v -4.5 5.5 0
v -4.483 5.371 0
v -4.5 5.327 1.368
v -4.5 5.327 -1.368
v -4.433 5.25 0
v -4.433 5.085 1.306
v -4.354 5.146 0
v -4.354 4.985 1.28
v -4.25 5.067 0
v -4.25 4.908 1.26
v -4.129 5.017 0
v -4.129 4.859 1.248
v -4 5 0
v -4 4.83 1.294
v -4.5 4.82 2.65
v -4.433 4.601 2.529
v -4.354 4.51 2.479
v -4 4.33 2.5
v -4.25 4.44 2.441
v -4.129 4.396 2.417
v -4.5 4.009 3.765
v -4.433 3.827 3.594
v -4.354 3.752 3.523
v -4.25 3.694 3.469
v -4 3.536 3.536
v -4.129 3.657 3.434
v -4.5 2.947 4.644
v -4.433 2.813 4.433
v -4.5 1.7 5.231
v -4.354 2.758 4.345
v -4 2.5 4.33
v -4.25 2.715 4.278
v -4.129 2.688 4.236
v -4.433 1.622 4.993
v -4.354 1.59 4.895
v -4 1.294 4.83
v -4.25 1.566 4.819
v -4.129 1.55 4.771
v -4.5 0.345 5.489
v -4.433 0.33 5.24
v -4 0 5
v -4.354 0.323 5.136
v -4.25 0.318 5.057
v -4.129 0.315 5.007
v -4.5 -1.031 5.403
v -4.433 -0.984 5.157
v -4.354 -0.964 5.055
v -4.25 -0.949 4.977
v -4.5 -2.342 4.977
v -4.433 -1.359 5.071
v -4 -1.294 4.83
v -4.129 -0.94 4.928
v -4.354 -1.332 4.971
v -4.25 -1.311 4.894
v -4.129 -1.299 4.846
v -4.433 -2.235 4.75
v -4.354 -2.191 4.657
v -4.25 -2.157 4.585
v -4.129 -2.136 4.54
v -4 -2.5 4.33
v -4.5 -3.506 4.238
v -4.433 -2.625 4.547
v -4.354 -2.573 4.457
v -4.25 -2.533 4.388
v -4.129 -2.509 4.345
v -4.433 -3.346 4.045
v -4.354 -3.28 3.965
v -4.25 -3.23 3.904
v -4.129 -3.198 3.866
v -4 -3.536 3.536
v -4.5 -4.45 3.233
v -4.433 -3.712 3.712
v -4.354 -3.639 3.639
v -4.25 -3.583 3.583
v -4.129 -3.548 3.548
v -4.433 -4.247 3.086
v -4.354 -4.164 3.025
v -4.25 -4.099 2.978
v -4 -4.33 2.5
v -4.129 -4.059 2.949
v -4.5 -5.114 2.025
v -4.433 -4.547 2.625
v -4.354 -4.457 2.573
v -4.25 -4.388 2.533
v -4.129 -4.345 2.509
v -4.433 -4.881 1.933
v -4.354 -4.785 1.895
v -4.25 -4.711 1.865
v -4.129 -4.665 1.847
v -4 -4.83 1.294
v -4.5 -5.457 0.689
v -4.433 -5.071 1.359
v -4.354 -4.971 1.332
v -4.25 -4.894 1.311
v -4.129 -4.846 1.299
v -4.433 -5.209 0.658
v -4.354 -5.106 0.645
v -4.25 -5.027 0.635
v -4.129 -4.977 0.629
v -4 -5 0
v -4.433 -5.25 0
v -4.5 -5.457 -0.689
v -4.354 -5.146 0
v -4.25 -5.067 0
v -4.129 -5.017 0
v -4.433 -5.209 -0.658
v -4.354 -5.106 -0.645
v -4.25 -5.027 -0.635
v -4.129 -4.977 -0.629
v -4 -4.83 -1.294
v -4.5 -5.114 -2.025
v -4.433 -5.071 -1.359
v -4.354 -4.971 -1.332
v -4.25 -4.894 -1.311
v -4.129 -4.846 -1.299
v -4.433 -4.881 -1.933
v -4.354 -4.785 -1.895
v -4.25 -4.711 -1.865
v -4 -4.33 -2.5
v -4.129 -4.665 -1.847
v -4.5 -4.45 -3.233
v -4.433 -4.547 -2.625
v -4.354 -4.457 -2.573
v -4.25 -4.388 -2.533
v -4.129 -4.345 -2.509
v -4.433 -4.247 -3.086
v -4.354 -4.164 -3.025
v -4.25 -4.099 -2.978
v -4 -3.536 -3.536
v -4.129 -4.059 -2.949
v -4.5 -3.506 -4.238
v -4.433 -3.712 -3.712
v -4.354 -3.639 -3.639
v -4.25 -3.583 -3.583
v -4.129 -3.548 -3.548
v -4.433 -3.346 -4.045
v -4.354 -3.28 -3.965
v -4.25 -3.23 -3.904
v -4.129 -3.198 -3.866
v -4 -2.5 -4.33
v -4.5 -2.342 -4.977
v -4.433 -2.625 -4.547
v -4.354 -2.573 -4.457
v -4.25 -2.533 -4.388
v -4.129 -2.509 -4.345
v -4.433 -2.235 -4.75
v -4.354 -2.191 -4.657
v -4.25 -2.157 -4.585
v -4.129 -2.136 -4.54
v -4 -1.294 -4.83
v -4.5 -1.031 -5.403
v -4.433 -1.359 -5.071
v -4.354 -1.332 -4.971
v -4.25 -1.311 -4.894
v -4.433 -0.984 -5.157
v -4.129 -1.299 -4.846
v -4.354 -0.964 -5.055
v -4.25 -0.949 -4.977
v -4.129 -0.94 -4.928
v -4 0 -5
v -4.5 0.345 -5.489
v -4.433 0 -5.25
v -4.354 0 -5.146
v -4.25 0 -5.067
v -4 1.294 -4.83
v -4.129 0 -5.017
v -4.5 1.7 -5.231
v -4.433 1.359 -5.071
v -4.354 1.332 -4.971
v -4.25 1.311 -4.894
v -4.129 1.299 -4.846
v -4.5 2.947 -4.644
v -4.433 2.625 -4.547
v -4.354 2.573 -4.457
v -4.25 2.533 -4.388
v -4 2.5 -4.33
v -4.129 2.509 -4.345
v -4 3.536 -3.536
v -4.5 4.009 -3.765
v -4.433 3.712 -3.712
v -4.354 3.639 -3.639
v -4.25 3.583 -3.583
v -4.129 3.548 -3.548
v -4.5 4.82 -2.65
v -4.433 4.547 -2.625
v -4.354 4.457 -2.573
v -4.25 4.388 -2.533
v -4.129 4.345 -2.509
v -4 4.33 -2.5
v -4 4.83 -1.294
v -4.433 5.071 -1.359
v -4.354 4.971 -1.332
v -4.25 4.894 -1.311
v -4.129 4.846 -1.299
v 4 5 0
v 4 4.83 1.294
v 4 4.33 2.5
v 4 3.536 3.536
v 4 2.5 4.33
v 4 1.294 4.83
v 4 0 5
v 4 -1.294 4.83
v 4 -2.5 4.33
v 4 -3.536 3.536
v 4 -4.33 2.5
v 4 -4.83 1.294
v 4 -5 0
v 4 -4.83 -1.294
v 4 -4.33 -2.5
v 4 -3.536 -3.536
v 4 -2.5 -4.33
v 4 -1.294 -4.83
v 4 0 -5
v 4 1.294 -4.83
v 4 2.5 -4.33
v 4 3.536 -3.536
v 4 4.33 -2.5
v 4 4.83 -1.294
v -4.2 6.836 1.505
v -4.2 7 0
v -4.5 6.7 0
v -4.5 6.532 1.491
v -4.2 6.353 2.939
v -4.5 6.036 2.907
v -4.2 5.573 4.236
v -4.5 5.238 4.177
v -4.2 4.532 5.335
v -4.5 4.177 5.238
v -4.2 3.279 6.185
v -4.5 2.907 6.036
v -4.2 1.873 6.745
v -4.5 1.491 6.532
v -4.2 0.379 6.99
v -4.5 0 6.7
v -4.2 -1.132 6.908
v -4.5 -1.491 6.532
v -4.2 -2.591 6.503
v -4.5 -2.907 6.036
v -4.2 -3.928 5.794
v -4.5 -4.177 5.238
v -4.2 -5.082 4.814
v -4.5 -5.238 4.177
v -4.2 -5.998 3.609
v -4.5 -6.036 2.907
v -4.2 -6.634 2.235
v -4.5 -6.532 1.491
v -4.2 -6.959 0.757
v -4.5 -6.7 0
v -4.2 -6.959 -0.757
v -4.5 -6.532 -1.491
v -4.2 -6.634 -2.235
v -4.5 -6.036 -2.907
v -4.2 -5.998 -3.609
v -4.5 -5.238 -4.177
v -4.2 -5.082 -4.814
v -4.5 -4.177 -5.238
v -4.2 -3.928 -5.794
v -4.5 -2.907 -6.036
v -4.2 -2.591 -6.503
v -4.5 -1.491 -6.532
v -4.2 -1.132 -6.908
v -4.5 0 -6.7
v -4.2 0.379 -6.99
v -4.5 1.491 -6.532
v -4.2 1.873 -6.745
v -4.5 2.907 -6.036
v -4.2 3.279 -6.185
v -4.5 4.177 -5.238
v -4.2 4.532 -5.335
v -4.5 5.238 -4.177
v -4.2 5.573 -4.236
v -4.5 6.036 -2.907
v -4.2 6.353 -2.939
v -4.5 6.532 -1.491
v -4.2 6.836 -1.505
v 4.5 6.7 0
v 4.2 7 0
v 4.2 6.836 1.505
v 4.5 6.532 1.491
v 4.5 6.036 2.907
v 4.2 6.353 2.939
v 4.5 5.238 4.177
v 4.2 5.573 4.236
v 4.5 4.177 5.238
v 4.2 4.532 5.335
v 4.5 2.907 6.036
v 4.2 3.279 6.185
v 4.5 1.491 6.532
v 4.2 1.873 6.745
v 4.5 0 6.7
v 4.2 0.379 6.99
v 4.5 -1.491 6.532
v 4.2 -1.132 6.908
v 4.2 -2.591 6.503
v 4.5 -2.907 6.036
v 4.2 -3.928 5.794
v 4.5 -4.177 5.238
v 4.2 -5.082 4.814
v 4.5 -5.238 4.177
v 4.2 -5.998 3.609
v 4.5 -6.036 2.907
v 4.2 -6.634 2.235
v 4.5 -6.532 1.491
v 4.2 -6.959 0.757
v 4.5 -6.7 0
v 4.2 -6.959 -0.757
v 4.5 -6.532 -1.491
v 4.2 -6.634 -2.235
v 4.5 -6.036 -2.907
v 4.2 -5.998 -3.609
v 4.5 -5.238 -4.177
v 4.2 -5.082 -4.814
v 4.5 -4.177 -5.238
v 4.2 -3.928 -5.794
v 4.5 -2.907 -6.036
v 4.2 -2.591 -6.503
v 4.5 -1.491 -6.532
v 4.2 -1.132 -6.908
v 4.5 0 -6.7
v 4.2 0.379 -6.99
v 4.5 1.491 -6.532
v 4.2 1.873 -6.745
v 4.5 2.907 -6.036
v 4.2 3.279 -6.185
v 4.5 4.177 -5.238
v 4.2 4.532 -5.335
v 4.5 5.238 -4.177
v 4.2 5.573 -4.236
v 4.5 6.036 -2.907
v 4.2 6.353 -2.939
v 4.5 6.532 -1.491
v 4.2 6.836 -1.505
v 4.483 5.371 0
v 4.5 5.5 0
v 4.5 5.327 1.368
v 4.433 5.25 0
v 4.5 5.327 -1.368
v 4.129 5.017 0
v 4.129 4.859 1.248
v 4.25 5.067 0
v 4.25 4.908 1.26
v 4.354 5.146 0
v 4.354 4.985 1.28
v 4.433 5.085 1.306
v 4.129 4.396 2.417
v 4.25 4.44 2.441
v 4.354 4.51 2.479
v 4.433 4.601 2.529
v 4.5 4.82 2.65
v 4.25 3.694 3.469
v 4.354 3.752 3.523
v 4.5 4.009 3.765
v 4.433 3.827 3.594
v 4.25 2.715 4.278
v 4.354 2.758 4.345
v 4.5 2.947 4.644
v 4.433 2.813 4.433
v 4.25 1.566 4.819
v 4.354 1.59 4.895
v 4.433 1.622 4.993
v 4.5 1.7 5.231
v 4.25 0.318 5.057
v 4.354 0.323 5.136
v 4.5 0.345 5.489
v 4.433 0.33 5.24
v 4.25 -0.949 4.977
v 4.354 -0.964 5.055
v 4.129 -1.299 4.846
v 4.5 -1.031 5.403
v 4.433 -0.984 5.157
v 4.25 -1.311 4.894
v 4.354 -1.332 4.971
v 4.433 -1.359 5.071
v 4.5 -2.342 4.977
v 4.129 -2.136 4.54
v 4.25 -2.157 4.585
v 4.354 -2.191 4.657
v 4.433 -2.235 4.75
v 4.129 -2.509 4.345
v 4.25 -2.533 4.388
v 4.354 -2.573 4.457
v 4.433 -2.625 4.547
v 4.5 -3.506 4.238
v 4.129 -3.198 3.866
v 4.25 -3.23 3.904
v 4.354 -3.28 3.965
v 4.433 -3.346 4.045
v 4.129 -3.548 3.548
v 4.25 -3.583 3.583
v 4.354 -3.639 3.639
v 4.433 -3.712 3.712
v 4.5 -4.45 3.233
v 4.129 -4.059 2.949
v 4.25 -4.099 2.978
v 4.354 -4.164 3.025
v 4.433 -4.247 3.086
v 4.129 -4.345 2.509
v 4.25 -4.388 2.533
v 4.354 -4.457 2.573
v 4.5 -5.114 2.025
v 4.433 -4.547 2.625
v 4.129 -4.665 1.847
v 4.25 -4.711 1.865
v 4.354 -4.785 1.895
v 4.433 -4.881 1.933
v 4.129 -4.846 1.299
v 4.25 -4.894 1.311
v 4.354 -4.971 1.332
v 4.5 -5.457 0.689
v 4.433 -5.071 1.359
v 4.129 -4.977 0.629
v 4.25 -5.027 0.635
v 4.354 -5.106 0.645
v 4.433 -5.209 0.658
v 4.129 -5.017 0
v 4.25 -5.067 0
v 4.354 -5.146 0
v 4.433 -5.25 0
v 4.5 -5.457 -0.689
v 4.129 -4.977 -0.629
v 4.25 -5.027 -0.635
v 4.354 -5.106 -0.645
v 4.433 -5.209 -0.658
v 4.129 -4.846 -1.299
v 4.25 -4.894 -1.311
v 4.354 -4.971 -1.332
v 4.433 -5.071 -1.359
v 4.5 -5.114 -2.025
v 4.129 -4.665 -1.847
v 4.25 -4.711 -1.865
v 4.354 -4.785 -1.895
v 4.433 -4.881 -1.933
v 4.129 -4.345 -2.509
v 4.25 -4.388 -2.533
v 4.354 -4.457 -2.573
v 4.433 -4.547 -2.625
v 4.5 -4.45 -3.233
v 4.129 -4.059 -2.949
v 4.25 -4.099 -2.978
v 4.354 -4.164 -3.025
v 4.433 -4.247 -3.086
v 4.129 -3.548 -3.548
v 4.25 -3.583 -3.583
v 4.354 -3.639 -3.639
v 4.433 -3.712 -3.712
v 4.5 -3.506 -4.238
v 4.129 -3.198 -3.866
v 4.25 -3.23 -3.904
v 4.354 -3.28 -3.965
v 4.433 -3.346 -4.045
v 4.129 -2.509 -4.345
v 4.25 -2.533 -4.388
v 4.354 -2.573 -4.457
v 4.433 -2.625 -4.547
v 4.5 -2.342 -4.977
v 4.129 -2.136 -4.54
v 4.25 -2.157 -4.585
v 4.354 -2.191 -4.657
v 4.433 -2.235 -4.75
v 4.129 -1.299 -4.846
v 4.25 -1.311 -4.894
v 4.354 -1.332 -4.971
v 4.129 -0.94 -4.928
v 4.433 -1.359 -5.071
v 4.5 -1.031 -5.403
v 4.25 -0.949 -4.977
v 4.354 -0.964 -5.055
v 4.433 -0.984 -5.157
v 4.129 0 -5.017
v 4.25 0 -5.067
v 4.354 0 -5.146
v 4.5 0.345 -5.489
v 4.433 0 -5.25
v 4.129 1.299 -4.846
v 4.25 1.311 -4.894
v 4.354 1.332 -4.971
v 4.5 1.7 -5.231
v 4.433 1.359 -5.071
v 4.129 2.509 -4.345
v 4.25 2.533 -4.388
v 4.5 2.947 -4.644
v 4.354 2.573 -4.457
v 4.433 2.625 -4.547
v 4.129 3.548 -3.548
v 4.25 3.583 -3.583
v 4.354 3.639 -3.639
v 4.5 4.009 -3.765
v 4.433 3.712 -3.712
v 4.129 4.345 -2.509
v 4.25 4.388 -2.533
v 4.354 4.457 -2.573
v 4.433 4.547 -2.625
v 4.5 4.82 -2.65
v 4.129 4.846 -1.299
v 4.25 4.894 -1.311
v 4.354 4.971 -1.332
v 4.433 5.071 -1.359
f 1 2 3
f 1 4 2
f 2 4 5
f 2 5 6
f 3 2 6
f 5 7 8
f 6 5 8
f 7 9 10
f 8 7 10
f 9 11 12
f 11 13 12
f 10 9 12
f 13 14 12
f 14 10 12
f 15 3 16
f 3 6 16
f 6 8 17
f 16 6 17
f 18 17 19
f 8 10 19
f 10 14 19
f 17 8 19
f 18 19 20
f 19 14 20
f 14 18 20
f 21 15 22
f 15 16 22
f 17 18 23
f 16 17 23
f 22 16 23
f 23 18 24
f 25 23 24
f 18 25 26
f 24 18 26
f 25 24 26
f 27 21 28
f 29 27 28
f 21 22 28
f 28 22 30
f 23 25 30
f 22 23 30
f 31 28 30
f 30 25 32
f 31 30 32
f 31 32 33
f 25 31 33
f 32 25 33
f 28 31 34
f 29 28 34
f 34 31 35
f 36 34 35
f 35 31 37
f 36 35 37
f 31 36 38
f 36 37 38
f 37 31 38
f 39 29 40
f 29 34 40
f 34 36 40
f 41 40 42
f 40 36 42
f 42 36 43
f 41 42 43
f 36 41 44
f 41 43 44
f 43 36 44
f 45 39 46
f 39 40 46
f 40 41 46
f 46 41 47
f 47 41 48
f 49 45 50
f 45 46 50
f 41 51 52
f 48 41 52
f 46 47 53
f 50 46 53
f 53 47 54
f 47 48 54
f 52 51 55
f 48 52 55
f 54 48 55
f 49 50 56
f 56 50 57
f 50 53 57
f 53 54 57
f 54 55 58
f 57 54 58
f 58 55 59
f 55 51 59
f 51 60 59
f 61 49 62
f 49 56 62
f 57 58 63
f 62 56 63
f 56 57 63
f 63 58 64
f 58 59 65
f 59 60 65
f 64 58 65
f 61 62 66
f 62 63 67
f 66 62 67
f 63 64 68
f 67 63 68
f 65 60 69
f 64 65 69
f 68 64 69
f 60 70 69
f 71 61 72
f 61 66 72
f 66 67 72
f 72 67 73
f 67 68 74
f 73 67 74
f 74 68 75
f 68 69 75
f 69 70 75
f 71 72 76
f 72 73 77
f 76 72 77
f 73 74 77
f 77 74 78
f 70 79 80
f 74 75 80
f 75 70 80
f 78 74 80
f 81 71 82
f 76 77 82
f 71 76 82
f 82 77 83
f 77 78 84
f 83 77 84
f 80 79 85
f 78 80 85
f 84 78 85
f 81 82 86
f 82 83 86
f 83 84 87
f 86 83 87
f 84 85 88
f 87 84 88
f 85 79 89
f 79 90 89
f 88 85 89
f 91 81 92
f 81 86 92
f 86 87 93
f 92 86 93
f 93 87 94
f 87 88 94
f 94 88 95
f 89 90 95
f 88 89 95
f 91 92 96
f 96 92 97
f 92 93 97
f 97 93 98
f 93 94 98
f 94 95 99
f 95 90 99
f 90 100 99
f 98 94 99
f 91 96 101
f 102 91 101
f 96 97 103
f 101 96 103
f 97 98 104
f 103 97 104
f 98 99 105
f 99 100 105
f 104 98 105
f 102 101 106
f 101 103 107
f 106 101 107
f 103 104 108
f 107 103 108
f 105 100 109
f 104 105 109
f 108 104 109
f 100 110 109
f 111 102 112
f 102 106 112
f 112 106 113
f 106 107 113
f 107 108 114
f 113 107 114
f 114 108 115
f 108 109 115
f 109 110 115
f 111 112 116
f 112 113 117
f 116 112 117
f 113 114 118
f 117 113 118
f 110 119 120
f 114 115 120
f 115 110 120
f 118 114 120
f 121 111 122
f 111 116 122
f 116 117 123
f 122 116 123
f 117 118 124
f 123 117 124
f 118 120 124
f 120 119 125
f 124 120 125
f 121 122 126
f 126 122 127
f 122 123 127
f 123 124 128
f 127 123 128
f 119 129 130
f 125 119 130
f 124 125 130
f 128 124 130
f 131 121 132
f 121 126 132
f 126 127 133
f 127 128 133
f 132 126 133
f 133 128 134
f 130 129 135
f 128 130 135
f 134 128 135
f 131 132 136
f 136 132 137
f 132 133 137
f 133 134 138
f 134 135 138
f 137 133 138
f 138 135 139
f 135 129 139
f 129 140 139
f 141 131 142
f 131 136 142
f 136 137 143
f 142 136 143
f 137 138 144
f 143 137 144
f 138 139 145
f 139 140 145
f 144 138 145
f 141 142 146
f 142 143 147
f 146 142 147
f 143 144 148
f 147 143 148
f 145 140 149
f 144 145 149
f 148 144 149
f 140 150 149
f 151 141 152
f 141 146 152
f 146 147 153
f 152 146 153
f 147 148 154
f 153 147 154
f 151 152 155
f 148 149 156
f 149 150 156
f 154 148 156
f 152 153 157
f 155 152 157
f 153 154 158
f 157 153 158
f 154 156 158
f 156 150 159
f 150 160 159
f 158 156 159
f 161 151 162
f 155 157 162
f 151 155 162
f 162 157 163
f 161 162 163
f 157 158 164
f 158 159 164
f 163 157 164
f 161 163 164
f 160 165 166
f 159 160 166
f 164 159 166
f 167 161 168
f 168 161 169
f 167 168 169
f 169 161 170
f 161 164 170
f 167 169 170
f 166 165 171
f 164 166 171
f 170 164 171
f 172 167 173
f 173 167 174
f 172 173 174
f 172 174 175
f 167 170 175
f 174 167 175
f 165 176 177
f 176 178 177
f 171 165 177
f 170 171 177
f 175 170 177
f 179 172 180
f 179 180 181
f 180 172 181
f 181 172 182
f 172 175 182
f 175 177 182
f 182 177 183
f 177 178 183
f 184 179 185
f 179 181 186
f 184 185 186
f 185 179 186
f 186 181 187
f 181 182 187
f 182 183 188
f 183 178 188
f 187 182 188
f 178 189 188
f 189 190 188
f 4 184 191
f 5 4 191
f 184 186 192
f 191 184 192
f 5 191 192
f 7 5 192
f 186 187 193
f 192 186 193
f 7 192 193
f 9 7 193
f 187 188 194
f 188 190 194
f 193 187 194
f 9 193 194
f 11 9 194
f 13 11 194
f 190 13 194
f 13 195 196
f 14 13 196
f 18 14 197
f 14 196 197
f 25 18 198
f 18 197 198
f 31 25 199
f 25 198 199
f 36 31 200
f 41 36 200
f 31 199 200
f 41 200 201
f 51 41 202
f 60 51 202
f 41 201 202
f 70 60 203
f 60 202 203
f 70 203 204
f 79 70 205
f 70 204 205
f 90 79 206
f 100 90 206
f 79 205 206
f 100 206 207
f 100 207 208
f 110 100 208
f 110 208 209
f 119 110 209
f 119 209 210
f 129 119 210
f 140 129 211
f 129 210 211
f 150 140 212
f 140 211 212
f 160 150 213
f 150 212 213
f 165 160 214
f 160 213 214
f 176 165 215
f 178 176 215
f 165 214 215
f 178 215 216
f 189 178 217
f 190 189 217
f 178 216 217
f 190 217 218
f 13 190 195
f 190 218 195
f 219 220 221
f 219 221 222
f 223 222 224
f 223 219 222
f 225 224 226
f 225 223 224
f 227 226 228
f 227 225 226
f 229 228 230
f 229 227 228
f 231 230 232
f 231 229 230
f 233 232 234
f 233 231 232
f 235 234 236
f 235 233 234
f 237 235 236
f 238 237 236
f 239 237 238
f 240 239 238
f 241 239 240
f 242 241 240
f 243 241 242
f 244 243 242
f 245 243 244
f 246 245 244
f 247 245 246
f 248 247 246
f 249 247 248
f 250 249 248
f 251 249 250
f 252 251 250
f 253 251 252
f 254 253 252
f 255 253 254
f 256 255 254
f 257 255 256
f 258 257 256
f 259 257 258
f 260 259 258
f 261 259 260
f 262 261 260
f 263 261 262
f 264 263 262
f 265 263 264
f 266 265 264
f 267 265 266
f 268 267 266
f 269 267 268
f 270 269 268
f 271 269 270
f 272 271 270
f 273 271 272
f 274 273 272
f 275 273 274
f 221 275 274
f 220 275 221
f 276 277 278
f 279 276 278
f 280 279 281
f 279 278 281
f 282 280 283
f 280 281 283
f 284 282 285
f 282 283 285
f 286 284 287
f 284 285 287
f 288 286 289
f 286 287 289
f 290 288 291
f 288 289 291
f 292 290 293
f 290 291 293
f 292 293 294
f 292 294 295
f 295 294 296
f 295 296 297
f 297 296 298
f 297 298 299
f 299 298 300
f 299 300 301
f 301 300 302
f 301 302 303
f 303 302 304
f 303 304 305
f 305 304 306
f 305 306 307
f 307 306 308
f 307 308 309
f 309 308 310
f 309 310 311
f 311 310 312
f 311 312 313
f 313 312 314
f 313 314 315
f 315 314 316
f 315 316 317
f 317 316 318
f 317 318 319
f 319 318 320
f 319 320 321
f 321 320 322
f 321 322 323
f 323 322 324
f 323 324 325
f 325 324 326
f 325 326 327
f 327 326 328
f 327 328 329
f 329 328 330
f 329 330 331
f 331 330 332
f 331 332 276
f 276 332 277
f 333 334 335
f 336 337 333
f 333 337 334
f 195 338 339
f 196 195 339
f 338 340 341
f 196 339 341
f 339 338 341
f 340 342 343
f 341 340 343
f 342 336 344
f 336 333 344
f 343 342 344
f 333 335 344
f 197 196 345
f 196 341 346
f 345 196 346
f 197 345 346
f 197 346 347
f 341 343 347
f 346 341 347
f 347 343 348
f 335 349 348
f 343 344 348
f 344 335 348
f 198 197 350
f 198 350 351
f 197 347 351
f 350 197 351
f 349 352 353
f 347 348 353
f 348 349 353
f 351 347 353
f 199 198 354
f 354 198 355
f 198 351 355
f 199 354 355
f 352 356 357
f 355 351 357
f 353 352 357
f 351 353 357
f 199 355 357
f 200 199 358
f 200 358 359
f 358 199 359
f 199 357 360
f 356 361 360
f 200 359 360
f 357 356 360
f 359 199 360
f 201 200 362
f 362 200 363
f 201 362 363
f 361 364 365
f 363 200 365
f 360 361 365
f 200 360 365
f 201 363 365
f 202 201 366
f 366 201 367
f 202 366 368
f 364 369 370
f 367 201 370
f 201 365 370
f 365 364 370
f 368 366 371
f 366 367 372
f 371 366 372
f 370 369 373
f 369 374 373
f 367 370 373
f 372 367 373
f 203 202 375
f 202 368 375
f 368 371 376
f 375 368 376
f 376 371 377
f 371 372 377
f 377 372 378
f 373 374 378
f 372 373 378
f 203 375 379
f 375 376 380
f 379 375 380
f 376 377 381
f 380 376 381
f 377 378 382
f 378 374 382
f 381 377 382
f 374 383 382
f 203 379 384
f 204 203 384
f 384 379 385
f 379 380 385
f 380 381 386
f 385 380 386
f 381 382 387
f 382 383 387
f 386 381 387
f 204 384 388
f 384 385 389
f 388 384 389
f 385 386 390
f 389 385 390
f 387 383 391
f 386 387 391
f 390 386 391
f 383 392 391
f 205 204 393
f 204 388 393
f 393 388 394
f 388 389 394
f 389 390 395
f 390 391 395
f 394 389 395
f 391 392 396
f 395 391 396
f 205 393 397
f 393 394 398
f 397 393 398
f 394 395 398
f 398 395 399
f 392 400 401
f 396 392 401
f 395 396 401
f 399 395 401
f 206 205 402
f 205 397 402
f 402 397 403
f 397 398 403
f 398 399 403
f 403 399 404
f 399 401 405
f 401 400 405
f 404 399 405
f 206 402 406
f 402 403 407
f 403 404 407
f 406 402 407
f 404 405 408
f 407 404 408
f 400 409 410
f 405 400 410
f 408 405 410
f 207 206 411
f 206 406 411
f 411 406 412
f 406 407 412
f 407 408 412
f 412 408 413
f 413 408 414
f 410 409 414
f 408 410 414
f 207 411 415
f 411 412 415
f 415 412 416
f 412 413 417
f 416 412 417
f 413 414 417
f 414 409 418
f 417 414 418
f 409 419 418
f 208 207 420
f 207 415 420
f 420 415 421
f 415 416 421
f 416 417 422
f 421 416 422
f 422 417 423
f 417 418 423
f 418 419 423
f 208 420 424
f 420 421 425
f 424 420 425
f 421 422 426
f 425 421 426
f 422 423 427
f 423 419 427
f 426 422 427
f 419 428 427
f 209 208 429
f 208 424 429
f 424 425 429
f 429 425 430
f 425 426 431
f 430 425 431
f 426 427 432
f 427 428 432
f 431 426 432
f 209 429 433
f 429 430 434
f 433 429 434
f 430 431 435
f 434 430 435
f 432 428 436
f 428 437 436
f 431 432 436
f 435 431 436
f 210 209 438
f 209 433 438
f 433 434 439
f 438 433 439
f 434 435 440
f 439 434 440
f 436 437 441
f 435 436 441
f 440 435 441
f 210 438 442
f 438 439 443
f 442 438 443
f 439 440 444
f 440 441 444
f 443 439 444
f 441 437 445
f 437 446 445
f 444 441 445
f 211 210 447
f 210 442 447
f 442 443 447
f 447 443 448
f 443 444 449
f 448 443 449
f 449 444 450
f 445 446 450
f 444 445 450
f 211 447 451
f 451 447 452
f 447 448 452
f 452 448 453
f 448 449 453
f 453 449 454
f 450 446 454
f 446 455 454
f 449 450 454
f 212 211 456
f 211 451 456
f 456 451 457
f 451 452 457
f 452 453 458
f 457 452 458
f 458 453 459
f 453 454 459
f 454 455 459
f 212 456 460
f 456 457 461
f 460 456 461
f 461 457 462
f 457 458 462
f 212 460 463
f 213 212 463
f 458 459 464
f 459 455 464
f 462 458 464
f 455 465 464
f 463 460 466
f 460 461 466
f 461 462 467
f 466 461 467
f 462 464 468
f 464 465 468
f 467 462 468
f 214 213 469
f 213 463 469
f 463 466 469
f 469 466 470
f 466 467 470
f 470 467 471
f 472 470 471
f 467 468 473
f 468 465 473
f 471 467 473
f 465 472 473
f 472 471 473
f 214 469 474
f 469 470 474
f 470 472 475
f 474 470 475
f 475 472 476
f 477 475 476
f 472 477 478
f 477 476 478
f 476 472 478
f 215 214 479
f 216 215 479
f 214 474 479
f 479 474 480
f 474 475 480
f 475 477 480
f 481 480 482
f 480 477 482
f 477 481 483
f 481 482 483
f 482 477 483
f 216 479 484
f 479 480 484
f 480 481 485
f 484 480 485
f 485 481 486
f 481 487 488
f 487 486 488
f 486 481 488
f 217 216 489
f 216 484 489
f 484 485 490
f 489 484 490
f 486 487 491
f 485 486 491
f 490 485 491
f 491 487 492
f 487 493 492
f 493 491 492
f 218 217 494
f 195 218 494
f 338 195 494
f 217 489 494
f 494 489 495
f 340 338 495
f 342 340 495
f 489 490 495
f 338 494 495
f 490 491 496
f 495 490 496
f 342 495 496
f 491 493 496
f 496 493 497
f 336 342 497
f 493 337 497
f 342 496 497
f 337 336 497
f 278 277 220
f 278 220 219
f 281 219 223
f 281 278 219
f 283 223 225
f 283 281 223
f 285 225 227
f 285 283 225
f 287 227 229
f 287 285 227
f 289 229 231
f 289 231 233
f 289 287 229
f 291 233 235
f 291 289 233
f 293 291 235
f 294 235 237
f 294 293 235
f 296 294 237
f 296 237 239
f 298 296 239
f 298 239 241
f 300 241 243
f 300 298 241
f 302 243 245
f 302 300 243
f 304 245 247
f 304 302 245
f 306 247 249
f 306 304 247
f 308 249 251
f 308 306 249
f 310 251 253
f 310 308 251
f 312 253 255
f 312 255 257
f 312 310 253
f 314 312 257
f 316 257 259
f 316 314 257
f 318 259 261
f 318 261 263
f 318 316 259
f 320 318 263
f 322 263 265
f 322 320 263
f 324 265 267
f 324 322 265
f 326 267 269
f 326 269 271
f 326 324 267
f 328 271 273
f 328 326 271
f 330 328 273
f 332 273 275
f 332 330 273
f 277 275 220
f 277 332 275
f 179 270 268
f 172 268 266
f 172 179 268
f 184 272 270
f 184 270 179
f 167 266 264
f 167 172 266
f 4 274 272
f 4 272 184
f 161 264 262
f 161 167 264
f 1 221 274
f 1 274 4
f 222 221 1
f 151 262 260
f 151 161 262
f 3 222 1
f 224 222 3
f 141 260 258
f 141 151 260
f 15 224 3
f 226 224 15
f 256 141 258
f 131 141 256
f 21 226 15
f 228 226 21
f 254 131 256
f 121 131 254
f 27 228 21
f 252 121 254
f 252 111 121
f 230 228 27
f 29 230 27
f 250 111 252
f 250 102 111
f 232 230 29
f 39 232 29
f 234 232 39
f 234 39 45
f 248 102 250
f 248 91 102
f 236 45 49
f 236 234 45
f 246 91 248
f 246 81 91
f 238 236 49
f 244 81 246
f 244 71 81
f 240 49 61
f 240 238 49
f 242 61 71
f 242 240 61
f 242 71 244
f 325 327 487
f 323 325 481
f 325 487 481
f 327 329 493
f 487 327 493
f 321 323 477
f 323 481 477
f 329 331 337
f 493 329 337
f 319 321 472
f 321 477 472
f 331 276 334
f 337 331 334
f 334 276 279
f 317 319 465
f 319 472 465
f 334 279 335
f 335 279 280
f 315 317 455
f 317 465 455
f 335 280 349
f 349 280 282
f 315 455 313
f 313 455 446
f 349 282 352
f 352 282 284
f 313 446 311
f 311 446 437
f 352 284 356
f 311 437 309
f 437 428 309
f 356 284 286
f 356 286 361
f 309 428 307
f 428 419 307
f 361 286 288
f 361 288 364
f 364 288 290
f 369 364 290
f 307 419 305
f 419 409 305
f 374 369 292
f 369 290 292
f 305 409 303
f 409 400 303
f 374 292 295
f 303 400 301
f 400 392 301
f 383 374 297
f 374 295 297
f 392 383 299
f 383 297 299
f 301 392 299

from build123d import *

# Parameters (mm, degrees)
SKETCH_1_W     = 9
SKETCH_1_H     = 2
CHAMFER_1_SIZE = 0.3
FILLET_1_R     = 0.5


with BuildPart() as part:
    # 草圖1 → 旋轉1 (revolve)
    with BuildSketch(Plane.XY):
        with Locations((0, 6)):
            Rectangle(SKETCH_1_W, SKETCH_1_H)
    revolve(axis=Axis((-51.523727229, 0, 0), (1, 0, 0)))

    # 導角1
    chamfer_1_edges = [part.edges().sort_by_distance(p)[0] for p in [
        (4.5, -7, 0),
        (-4.5, -7, 0),
    ]]
    chamfer(chamfer_1_edges, length=CHAMFER_1_SIZE)

    # 圓角1
    fillet_1_edges = [part.edges().sort_by_distance(p)[0] for p in [
        (-4.5, -5, 0),
        (4.5, -5, 0),
    ]]
    fillet(fillet_1_edges, radius=FILLET_1_R)


solid = part.part
